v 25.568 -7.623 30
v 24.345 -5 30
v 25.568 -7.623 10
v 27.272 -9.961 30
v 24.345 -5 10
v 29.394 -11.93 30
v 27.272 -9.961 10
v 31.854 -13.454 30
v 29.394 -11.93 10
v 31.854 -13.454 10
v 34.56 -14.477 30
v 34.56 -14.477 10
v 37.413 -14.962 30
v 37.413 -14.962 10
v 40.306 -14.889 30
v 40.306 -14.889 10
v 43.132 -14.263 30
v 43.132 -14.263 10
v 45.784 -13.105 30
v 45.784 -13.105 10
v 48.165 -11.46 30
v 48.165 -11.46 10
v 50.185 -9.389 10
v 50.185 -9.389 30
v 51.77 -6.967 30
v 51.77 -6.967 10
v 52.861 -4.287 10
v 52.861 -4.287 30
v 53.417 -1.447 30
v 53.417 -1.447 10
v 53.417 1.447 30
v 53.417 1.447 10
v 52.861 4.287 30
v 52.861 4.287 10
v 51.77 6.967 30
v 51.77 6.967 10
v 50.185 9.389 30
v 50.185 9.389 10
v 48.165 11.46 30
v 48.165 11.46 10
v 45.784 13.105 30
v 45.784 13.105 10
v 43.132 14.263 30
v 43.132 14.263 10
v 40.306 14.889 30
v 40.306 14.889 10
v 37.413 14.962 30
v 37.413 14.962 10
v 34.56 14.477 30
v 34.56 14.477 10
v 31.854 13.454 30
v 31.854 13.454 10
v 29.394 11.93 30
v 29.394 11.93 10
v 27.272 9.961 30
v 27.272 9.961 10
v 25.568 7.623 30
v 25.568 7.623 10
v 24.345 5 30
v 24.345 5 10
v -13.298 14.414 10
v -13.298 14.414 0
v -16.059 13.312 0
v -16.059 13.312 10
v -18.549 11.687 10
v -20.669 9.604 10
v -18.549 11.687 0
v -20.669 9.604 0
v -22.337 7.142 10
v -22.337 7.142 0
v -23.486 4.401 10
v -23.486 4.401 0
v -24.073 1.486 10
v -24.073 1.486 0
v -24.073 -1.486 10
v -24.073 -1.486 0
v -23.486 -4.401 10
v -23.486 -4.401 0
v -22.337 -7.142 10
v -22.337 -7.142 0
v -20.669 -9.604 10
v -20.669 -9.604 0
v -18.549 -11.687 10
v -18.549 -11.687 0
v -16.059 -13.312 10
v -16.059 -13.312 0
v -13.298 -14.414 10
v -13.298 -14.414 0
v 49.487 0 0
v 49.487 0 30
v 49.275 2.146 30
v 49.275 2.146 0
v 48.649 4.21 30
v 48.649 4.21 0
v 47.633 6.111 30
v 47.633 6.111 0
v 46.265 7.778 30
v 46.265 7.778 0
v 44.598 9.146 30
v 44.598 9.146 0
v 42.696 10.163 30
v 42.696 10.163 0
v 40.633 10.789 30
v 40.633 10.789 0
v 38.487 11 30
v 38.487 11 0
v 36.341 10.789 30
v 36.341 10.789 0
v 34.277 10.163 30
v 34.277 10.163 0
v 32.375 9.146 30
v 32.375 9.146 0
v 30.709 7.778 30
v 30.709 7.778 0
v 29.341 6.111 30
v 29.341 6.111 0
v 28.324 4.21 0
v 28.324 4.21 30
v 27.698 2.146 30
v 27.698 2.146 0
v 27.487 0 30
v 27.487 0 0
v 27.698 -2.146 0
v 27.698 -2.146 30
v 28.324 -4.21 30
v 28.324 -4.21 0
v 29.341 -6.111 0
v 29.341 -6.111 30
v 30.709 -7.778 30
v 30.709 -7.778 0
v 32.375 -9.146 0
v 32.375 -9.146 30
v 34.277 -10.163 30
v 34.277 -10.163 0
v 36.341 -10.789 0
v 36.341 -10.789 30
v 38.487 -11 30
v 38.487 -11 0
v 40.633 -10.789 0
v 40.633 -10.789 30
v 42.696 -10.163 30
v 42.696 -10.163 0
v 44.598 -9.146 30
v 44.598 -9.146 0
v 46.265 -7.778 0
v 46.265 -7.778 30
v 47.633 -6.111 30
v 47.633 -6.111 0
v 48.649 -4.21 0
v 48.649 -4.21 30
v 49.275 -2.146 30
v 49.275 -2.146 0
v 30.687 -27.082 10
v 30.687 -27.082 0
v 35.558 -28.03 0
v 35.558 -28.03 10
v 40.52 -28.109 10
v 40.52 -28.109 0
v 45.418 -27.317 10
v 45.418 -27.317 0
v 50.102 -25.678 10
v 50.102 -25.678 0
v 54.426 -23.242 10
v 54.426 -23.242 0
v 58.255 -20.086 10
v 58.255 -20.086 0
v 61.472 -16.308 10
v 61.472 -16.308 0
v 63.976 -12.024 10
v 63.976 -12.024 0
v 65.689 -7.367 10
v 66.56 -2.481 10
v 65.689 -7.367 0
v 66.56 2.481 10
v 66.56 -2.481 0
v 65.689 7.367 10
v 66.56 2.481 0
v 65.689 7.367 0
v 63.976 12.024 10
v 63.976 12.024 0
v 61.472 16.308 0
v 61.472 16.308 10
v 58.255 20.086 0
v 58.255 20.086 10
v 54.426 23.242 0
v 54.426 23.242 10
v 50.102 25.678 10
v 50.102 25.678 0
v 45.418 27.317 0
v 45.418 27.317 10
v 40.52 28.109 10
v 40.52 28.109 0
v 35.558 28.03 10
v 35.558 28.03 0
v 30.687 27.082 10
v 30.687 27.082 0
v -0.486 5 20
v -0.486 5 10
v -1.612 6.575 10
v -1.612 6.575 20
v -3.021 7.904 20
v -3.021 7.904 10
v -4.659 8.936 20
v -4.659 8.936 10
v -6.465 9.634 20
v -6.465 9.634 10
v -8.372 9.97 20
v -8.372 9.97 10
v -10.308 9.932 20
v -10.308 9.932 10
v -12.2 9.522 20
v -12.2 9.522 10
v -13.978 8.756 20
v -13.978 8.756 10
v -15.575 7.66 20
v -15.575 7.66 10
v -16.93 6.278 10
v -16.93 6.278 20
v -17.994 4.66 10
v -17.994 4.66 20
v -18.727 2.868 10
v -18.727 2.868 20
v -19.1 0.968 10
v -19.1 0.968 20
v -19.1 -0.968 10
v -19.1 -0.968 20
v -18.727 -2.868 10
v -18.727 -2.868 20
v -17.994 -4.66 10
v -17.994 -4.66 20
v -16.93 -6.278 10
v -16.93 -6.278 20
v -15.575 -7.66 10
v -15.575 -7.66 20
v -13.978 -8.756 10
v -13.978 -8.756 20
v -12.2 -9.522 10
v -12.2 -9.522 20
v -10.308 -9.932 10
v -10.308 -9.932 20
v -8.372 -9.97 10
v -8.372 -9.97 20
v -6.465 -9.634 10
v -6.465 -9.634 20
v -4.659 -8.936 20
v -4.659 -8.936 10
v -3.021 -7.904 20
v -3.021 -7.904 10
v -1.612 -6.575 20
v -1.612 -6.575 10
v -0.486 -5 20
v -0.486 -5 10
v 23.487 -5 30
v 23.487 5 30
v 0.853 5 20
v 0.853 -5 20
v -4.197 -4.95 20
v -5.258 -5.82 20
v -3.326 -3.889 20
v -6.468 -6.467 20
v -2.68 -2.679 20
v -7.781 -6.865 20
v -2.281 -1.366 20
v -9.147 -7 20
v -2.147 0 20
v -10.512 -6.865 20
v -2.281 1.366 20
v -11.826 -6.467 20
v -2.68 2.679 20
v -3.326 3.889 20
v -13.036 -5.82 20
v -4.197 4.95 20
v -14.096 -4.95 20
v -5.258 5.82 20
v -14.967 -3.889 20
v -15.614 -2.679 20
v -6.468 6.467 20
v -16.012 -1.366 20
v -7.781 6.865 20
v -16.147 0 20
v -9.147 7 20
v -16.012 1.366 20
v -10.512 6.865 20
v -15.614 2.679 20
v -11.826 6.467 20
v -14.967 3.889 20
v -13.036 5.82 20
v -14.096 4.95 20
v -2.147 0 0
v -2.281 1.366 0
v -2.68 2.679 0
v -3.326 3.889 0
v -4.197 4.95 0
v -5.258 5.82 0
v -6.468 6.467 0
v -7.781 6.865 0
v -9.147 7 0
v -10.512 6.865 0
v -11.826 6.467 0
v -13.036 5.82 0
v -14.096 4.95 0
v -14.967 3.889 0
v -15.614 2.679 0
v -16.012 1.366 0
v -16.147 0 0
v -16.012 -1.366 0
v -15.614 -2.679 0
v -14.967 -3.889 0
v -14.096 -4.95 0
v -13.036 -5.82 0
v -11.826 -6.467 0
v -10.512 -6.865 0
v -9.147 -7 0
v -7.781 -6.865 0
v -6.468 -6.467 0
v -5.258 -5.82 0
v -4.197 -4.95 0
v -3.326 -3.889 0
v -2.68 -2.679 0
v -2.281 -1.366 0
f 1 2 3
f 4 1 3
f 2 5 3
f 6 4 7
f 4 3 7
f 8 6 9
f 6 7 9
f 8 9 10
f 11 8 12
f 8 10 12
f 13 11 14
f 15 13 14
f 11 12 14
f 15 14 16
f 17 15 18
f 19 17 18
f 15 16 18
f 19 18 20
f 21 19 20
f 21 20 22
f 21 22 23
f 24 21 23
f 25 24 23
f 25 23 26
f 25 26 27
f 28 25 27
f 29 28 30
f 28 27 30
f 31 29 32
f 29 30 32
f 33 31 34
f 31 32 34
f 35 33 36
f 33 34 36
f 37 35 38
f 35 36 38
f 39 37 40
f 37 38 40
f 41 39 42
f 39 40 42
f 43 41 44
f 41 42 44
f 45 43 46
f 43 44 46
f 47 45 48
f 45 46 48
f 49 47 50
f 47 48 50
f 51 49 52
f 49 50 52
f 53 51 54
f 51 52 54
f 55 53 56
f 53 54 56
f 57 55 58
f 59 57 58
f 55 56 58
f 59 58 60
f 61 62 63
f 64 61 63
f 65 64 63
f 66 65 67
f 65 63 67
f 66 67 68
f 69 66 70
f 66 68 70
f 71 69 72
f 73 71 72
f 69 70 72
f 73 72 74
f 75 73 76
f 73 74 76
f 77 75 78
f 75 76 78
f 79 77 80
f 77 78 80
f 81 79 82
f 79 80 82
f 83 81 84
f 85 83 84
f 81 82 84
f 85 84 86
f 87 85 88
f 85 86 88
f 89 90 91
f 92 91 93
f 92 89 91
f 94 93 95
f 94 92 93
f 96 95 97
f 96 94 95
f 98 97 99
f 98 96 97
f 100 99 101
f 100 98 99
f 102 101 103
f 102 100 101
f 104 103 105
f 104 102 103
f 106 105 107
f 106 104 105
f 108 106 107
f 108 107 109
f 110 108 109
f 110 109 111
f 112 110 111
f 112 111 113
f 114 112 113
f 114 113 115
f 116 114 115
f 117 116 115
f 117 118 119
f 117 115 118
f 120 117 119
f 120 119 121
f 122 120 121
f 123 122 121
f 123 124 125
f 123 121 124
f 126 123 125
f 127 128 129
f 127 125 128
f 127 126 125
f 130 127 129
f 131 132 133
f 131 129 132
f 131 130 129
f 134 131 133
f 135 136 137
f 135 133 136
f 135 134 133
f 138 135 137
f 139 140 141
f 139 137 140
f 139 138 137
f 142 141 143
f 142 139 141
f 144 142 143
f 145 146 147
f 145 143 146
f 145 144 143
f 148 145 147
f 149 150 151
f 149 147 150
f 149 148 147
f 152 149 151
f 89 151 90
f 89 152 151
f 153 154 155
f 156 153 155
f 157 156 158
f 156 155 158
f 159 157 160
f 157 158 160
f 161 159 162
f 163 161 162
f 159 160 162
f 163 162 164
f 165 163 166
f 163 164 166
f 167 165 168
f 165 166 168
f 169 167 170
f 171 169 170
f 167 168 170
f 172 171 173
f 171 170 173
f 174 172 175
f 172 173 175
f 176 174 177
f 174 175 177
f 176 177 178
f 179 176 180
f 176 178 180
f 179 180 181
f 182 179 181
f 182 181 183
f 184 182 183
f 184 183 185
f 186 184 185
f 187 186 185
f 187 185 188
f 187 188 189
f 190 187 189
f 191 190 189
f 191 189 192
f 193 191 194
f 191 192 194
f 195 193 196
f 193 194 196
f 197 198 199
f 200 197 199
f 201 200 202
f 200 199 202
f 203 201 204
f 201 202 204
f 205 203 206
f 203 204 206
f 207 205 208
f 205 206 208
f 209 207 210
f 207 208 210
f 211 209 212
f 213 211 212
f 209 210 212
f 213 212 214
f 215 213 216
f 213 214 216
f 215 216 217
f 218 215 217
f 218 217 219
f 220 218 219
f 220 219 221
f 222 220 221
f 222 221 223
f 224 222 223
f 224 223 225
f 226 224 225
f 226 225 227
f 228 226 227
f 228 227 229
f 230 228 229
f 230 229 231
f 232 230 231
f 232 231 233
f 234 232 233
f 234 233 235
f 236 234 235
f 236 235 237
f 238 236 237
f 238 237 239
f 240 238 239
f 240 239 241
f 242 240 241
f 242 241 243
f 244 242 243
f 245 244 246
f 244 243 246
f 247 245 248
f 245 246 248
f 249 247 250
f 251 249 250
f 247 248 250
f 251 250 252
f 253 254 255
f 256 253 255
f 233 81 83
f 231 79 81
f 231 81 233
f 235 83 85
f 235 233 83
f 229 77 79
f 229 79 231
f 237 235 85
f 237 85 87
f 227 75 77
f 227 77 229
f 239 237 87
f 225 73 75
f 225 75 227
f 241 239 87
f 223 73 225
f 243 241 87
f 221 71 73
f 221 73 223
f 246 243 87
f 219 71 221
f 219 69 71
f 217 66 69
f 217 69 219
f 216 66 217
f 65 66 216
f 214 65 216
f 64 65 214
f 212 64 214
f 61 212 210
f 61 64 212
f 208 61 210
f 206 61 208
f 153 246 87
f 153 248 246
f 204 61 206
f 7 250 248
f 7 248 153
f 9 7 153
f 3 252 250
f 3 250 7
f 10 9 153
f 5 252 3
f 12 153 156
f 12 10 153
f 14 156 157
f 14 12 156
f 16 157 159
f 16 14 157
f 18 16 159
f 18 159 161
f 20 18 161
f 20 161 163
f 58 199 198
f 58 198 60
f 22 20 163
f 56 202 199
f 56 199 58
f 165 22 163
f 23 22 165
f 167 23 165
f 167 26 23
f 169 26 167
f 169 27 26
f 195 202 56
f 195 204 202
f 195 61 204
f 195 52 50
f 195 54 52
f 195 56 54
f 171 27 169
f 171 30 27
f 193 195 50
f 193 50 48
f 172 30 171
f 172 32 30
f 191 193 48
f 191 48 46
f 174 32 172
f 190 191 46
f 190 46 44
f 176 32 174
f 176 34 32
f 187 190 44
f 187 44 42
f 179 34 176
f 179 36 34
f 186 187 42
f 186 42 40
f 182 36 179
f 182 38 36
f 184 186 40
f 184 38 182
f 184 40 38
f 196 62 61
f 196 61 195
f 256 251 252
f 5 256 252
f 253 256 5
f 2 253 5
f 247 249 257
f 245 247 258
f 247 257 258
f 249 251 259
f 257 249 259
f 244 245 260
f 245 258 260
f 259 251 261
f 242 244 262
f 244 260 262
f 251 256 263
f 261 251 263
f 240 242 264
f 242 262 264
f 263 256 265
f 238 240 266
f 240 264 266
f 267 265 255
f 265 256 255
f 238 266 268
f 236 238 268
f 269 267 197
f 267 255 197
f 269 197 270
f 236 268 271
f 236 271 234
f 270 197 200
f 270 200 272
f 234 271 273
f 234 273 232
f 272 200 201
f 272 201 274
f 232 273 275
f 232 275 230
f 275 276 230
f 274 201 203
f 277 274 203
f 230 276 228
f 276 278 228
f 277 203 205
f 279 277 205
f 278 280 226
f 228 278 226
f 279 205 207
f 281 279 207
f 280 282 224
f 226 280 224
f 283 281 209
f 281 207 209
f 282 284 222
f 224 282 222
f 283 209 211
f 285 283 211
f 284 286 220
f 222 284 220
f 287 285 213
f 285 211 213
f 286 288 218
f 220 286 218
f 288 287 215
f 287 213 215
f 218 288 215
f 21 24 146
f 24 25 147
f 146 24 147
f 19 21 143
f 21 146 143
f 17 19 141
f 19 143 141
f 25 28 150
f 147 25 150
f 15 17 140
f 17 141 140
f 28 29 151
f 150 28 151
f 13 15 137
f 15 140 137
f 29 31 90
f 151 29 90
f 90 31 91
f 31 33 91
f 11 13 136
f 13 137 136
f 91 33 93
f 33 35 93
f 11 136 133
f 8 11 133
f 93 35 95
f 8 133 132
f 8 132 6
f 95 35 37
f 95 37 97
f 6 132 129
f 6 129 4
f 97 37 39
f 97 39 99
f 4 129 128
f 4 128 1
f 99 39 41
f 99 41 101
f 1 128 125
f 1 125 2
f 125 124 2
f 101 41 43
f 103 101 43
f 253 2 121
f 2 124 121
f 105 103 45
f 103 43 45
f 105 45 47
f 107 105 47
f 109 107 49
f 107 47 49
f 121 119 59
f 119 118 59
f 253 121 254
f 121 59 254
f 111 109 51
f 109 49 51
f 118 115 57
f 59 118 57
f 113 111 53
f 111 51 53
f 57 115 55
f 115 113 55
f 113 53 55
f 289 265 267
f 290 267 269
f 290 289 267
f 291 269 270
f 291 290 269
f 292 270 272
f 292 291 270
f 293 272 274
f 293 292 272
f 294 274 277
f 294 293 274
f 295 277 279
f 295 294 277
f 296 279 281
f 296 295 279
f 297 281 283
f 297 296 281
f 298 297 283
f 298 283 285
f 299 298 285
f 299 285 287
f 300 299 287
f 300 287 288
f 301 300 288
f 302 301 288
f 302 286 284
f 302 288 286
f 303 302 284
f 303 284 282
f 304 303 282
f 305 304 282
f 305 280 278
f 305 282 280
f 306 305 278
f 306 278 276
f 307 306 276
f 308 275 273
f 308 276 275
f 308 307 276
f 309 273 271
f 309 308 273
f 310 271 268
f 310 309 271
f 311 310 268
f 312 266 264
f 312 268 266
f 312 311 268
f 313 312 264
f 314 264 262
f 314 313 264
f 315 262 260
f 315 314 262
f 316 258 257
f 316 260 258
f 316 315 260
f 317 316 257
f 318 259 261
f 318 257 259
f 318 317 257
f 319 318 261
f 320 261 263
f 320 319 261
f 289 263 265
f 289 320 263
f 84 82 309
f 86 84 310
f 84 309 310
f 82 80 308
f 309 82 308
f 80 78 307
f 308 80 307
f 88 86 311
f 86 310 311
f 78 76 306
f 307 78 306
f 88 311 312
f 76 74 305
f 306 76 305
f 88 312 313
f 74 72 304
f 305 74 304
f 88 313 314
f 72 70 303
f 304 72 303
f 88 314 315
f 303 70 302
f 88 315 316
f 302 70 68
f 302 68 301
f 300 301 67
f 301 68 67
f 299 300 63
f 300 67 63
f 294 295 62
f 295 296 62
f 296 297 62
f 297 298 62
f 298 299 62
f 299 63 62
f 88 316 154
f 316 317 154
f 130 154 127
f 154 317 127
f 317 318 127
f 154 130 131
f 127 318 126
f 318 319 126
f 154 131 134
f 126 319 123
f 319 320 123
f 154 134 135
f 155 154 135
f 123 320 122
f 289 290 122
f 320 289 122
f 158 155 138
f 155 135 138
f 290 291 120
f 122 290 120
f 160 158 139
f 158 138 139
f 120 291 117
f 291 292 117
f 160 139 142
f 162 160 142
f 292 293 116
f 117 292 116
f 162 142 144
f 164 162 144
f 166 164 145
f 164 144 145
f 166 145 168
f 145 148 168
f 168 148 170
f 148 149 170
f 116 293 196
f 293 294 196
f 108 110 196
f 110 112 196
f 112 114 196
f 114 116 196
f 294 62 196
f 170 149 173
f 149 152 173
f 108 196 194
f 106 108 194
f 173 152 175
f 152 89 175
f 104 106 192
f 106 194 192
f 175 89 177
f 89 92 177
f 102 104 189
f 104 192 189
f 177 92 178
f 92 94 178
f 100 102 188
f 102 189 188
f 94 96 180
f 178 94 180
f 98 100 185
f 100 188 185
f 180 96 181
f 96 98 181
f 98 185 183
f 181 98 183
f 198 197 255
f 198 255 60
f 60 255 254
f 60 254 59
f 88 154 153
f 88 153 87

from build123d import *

# Parameters (mm, degrees)
PAD_DEPTH     = 10
SKETCH001_R   = 15
PAD001_DEPTH  = 30
SKETCH002_R   = 10
PAD002_DEPTH  = 20
SKETCH003_R   = 7
SKETCH003_R_2 = 11
POCKET_DEPTH  = 30.001
PAD003_DEPTH  = 5


with BuildPart() as part:
    # Sketch → Pad (new body)
    with BuildSketch(Plane.XY):
        with BuildLine():
            ThreePointArc((-13.297973, 14.4138), (-24.146408, -1e-06), (-13.297971, -14.4138))
            Line((30.687086, -27.081719), (-13.297971, -14.4138))
            ThreePointArc((30.687086, -27.081719), (66.669258, 1.3e-05), (30.687062, 27.081712))
            Line((-13.297973, 14.4138), (30.687062, 27.081712))
        make_face()
    extrude(amount=PAD_DEPTH)

    # Sketch001 → Pad001 (join)
    with BuildSketch(Plane.XY):
        with Locations((38.486743, 0)):
            Circle(SKETCH001_R)
    extrude(amount=PAD001_DEPTH)

    # Sketch002 → Pad002 (join)
    with BuildSketch(Plane.XY):
        with Locations((-9.146726, 0)):
            Circle(SKETCH002_R)
    extrude(amount=PAD002_DEPTH)

    # Sketch003 → Pocket (cut, through all)
    with BuildSketch(Plane.XY):
        with Locations((-9.146726, 0)):
            Circle(SKETCH003_R)
        with Locations((38.486743, 0)):
            Circle(SKETCH003_R_2)
    extrude(amount=POCKET_DEPTH, mode=Mode.SUBTRACT)

    # Sketch004 (on DatumPlane) → Pad003 (join, symmetric)
    with BuildSketch(Plane(origin=(6.731097, 0, 0.333333), x_dir=(-1, 0, 0), z_dir=(0, 1, 0))):
        Polygon((-16.755646, 29.666667), (5.877823, 19.666667), (7.877823, 19.666667), (7.877823, 9.666667), (-18.755646, 9.666667), (-18.755646, 29.666667), align=None)
    extrude(amount=PAD003_DEPTH, both=True)


solid = part.part
